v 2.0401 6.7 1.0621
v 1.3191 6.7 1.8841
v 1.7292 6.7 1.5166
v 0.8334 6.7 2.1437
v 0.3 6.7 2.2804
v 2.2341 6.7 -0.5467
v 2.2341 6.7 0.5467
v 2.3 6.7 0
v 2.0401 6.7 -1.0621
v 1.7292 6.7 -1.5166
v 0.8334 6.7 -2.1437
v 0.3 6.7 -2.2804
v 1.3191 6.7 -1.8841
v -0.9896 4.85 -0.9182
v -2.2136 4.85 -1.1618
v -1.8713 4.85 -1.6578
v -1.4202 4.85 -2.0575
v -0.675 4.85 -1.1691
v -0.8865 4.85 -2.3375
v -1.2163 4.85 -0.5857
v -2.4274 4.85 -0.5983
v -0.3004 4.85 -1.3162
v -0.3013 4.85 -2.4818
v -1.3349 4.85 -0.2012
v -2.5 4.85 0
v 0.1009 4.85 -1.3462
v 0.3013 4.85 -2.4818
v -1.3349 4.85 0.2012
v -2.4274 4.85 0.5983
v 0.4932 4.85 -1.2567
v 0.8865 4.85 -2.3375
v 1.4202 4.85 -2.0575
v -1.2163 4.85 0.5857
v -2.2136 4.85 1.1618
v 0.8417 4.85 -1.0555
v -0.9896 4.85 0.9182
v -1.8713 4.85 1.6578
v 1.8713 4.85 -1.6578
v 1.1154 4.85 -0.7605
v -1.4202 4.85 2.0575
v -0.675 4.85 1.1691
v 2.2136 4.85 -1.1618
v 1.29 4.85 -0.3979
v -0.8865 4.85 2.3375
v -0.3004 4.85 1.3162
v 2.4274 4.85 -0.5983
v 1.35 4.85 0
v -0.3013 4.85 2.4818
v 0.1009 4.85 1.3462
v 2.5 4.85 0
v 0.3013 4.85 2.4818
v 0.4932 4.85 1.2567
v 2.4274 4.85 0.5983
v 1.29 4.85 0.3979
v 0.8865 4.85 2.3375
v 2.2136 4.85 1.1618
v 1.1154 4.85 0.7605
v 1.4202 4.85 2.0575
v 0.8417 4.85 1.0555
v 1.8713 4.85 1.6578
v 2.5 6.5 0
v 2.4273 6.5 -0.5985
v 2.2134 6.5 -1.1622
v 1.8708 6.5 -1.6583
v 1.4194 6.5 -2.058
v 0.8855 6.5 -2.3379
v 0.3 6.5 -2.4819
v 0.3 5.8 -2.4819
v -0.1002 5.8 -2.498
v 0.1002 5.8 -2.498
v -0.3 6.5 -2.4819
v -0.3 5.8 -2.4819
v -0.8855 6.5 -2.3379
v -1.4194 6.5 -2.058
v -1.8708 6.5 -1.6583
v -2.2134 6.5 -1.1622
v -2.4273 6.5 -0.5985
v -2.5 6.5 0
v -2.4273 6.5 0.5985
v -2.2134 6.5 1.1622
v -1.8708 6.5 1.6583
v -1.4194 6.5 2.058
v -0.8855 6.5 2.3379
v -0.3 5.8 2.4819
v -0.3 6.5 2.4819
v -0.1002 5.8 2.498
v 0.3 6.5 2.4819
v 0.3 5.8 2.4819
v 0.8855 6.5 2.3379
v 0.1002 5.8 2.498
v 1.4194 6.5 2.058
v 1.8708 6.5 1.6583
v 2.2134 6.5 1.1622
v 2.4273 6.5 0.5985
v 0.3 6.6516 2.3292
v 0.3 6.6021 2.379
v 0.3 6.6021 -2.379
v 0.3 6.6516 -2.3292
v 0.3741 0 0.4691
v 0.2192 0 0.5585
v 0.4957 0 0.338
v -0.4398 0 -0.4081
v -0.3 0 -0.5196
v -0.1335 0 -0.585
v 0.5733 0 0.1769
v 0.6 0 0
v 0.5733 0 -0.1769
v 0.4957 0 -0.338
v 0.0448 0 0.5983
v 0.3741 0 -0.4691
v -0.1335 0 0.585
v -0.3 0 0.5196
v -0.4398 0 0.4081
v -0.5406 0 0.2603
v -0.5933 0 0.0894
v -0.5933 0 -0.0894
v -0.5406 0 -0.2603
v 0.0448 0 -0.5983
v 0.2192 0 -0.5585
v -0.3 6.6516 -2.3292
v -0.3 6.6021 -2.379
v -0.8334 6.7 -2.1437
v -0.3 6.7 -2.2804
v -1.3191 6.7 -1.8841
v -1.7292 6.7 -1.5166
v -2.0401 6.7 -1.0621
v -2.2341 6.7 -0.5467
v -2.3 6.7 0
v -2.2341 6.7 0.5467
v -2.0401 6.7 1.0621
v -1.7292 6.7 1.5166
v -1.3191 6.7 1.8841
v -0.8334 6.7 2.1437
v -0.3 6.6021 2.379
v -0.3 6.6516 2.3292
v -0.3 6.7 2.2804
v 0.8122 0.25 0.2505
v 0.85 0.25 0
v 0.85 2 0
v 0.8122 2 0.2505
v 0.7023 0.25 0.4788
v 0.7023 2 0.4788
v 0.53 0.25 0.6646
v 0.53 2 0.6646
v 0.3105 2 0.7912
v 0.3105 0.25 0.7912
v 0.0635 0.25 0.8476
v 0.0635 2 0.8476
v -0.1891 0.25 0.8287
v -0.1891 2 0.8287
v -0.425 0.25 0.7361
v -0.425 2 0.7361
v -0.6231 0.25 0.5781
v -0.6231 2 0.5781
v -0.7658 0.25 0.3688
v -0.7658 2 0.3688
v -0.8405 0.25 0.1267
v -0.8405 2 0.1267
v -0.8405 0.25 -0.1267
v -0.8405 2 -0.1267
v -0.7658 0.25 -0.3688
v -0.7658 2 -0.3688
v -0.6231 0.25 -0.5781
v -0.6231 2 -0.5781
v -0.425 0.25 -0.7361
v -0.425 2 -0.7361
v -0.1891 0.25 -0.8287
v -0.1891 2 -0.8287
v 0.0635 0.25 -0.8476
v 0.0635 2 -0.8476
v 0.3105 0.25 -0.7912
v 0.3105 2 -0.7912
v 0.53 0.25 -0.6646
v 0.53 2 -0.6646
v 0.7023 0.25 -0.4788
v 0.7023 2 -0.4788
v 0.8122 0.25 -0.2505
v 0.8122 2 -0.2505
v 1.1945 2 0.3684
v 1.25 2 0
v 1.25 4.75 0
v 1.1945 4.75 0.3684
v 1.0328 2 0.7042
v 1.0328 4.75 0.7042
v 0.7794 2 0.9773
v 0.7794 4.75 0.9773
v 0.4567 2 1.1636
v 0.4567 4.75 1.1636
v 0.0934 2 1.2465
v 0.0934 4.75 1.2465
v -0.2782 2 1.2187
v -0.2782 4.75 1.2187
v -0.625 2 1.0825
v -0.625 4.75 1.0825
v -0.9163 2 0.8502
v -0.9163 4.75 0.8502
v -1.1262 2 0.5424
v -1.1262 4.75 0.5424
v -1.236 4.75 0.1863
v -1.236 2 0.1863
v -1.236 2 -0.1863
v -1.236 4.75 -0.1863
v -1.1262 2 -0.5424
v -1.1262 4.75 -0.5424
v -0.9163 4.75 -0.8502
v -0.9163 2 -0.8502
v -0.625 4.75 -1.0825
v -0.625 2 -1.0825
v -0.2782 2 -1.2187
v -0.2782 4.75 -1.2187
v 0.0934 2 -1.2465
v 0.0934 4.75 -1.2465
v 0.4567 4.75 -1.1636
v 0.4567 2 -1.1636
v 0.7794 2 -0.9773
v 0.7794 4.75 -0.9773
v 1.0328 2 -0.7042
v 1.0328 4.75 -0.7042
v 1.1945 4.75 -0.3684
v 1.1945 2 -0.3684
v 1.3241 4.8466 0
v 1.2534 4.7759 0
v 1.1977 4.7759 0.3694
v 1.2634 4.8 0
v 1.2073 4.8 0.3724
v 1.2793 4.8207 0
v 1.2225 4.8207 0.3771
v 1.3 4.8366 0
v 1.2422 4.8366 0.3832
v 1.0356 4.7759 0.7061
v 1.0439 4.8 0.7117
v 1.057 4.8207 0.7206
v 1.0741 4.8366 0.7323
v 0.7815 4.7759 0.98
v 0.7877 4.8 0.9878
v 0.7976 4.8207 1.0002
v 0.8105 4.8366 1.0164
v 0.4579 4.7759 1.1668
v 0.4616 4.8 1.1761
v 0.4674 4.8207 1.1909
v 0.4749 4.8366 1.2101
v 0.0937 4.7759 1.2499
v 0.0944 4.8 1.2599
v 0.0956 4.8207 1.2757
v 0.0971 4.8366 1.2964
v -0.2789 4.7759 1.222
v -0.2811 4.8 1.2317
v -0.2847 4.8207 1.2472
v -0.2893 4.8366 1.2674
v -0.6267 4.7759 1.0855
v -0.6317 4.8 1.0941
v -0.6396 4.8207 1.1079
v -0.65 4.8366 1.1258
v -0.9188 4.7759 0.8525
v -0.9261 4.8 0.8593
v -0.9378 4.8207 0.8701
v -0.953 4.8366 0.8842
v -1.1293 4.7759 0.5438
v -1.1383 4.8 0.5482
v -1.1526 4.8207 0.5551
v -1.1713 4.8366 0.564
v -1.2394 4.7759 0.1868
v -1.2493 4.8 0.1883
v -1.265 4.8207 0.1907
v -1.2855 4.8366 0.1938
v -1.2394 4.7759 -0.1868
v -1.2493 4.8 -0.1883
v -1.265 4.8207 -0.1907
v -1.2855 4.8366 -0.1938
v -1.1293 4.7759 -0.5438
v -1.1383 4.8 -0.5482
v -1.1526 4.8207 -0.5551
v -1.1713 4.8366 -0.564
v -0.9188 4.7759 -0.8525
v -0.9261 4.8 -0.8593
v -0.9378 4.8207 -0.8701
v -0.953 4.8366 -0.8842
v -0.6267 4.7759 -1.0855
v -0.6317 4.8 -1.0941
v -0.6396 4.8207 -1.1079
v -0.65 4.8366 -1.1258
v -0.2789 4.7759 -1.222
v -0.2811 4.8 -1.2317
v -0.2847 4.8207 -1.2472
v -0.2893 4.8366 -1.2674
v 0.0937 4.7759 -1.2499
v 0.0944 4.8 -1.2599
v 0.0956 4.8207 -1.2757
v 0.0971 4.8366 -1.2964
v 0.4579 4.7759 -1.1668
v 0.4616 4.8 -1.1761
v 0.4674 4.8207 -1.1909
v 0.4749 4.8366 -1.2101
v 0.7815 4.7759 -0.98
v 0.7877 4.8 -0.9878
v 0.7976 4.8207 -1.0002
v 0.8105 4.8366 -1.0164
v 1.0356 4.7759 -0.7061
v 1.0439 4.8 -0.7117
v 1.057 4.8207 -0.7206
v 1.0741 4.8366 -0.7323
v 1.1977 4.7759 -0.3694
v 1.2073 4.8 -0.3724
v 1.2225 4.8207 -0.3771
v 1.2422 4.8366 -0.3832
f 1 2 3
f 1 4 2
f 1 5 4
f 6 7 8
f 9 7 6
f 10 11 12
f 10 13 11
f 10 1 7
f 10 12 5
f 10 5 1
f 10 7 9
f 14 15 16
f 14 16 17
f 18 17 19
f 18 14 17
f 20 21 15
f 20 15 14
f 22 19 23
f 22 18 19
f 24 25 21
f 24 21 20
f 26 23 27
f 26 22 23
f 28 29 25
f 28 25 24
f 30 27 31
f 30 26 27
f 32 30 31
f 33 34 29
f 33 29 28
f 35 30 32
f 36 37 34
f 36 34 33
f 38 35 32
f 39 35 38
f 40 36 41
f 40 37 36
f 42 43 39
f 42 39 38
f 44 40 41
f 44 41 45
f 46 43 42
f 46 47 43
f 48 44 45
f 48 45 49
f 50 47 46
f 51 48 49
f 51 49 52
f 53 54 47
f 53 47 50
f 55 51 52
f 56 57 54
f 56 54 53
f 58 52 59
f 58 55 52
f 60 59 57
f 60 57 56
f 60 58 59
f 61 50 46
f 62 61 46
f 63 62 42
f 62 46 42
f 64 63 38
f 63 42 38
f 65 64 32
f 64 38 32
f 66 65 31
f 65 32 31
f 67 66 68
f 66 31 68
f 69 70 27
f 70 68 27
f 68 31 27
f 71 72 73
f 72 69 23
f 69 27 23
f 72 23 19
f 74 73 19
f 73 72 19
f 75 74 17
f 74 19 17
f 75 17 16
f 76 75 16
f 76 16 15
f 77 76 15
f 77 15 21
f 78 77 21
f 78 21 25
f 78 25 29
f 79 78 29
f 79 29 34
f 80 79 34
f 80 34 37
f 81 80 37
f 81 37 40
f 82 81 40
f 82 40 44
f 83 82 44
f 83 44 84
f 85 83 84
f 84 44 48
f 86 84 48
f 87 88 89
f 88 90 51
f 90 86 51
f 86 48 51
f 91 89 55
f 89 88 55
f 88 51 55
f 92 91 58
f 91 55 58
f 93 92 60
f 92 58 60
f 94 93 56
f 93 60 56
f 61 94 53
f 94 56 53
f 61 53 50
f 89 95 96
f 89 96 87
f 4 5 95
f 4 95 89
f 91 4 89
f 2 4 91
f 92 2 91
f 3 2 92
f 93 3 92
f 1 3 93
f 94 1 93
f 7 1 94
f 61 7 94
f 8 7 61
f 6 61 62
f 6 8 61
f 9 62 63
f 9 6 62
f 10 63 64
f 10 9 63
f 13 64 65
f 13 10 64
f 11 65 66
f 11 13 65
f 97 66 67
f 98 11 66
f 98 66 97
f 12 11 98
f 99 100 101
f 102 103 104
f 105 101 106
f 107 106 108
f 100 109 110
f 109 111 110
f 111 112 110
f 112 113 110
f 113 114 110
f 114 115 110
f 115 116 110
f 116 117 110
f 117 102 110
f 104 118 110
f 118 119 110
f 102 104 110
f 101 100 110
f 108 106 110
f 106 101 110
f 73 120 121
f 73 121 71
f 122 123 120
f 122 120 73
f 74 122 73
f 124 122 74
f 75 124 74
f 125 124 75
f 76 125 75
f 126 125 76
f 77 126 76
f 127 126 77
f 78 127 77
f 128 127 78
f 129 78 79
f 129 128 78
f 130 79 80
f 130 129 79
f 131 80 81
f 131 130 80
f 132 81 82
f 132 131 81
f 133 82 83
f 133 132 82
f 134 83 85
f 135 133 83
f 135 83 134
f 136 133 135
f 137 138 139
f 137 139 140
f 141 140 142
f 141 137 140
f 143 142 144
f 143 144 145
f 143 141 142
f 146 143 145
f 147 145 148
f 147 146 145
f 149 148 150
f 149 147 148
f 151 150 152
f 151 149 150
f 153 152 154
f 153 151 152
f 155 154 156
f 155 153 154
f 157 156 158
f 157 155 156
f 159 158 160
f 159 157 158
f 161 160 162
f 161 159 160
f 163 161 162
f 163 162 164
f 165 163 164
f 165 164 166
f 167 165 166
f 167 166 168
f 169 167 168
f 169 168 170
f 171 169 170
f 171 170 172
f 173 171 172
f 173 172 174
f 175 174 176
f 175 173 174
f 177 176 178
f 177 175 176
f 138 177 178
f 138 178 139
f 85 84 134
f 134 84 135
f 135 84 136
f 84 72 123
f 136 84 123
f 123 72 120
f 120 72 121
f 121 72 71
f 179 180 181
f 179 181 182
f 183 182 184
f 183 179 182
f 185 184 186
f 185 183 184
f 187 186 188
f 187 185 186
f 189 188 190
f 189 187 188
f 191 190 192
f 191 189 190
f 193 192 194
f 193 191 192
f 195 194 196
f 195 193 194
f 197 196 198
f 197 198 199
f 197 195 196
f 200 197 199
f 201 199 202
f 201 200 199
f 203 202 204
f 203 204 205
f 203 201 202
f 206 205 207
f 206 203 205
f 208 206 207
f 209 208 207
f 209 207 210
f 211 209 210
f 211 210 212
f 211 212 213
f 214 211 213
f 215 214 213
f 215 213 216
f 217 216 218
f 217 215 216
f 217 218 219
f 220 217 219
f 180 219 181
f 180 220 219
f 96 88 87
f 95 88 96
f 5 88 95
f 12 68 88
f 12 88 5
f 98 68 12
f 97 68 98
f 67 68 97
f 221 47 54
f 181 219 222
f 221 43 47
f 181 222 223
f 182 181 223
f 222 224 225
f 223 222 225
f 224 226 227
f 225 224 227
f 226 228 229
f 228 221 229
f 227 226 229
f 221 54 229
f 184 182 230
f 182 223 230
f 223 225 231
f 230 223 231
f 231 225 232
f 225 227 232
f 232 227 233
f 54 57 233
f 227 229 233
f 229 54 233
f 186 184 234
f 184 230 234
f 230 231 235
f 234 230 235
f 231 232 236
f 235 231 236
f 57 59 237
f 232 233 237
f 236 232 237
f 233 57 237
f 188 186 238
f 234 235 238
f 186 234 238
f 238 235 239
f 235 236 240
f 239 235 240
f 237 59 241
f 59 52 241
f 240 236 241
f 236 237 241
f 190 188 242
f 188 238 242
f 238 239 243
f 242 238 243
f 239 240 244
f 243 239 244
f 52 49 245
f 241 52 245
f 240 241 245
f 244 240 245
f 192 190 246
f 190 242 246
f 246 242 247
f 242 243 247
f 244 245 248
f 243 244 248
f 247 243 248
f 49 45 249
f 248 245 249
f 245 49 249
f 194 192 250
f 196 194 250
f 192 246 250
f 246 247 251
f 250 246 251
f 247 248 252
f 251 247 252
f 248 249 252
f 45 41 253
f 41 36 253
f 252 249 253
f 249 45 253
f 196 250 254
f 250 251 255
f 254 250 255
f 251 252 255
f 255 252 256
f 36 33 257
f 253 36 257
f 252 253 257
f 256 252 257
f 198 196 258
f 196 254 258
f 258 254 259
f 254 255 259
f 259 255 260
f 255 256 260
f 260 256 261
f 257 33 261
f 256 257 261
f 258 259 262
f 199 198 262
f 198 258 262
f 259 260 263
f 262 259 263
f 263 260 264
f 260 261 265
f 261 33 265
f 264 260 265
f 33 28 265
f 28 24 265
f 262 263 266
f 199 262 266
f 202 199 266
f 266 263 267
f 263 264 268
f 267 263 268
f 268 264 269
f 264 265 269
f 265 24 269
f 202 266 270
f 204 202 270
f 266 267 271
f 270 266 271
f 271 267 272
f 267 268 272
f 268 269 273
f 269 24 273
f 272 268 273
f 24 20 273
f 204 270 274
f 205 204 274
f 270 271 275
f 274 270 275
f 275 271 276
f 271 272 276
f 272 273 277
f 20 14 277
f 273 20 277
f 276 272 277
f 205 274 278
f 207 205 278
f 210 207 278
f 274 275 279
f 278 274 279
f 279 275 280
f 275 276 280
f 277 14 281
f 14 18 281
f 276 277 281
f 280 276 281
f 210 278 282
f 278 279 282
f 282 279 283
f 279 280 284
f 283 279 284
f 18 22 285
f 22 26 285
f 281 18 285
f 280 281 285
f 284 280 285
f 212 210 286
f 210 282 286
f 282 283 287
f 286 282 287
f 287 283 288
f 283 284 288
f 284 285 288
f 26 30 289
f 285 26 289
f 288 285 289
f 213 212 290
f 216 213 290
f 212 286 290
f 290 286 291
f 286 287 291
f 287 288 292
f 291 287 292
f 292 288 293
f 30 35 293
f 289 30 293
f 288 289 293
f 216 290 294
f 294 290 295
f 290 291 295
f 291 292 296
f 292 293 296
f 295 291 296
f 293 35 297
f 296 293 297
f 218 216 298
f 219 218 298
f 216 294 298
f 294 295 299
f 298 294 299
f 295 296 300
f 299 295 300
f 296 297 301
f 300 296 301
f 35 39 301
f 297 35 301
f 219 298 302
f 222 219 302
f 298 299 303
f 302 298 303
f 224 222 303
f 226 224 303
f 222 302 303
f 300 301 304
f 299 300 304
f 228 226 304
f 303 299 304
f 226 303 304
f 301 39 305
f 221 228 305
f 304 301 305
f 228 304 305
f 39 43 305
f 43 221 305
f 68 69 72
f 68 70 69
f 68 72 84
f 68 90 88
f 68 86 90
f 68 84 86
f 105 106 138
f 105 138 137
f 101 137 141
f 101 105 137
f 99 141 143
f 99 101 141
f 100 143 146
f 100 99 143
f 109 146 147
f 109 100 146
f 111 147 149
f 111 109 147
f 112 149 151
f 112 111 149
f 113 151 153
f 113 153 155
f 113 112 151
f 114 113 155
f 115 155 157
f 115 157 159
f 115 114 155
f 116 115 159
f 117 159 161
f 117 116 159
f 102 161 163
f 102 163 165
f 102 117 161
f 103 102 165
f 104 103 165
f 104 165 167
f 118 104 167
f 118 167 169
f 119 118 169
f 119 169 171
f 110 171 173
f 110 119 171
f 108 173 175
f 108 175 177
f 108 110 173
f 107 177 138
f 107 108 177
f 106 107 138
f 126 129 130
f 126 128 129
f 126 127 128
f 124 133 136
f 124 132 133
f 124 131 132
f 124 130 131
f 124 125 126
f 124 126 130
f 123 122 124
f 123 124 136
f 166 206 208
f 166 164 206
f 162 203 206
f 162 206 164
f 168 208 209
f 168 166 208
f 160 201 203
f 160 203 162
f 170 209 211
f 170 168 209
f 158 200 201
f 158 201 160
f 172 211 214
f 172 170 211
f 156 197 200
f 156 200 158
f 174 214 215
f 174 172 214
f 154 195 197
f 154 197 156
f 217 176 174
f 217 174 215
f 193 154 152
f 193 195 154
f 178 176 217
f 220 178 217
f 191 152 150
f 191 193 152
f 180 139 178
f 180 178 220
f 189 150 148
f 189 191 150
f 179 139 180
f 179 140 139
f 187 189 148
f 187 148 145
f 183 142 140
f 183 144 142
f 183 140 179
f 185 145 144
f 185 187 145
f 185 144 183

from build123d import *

# Parameters (mm, degrees)
SKETCH1_R               = 2.5
BOSS_EXTRUDE1_DEPTH     = 6.7
SKETCH2_OUTSIDE_W       = 8.948
SKETCH2_OUTSIDE_H       = 8.948
SKETCH2_OUTSIDE_R       = 0.85
CUT_EXTRUDE1_DEPTH      = 2
SKETCH3_OUTSIDE_W       = 8.948
SKETCH3_OUTSIDE_H       = 8.948
SKETCH3_OUTSIDE_R       = 1.25
CUT_EXTRUDE2_DEPTH      = 2.85
CHAMFER1_SIZE           = 0.2
SKETCH4_W               = 0.6
SKETCH4_H               = 0.9
CUT_EXTRUDE3_DEPTH      = 3.5
CUT_EXTRUDE3_DEPTH_BACK = 3.5
CHAMFER2_SIZE           = 0.25
FILLET1_R               = 0.1


with BuildPart() as part:
    # Sketch1 → Boss-Extrude1 (new body)
    with BuildSketch(Plane(origin=(0, 0, 0), x_dir=(1, 0, 0), z_dir=(0, 1, 0))):
        Circle(SKETCH1_R)
    extrude(amount=BOSS_EXTRUDE1_DEPTH)

    # Sketch2 outside → Cut-Extrude1 (cut)
    with BuildSketch(Plane.XZ):
        Rectangle(SKETCH2_OUTSIDE_W, SKETCH2_OUTSIDE_H)
        Circle(SKETCH2_OUTSIDE_R, mode=Mode.SUBTRACT)
    extrude(amount=-CUT_EXTRUDE1_DEPTH, mode=Mode.SUBTRACT)

    # Sketch3 outside → Cut-Extrude2 (cut)
    with BuildSketch(Plane.XZ.offset(-2)):
        Rectangle(SKETCH3_OUTSIDE_W, SKETCH3_OUTSIDE_H)
        Circle(SKETCH3_OUTSIDE_R, mode=Mode.SUBTRACT)
    extrude(amount=-CUT_EXTRUDE2_DEPTH, mode=Mode.SUBTRACT)

    # Chamfer1
    chamfer1_edges = [part.edges().sort_by_distance(p)[0] for p in [
        (-2.5, 6.7, 0),
    ]]
    chamfer(chamfer1_edges, length=CHAMFER1_SIZE)

    # Sketch4 → Cut-Extrude3 (cut, two sides)
    with BuildSketch(Plane.XY) as cut_extrude3_sk:
        with Locations((0, 6.25)):
            Rectangle(SKETCH4_W, SKETCH4_H)
    extrude(amount=CUT_EXTRUDE3_DEPTH, mode=Mode.SUBTRACT)
    extrude(cut_extrude3_sk.sketch, amount=-CUT_EXTRUDE3_DEPTH_BACK, mode=Mode.SUBTRACT)

    # Chamfer2
    chamfer2_edges = [part.edges().sort_by_distance(p)[0] for p in [
        (-0.85, 0, 0),
    ]]
    chamfer(chamfer2_edges, length=CHAMFER2_SIZE)

    # Fillet1
    fillet1_edges = [part.edges().sort_by_distance(p)[0] for p in [
        (-1.25, 4.85, 0),
    ]]
    fillet(fillet1_edges, radius=FILLET1_R)


solid = part.part
